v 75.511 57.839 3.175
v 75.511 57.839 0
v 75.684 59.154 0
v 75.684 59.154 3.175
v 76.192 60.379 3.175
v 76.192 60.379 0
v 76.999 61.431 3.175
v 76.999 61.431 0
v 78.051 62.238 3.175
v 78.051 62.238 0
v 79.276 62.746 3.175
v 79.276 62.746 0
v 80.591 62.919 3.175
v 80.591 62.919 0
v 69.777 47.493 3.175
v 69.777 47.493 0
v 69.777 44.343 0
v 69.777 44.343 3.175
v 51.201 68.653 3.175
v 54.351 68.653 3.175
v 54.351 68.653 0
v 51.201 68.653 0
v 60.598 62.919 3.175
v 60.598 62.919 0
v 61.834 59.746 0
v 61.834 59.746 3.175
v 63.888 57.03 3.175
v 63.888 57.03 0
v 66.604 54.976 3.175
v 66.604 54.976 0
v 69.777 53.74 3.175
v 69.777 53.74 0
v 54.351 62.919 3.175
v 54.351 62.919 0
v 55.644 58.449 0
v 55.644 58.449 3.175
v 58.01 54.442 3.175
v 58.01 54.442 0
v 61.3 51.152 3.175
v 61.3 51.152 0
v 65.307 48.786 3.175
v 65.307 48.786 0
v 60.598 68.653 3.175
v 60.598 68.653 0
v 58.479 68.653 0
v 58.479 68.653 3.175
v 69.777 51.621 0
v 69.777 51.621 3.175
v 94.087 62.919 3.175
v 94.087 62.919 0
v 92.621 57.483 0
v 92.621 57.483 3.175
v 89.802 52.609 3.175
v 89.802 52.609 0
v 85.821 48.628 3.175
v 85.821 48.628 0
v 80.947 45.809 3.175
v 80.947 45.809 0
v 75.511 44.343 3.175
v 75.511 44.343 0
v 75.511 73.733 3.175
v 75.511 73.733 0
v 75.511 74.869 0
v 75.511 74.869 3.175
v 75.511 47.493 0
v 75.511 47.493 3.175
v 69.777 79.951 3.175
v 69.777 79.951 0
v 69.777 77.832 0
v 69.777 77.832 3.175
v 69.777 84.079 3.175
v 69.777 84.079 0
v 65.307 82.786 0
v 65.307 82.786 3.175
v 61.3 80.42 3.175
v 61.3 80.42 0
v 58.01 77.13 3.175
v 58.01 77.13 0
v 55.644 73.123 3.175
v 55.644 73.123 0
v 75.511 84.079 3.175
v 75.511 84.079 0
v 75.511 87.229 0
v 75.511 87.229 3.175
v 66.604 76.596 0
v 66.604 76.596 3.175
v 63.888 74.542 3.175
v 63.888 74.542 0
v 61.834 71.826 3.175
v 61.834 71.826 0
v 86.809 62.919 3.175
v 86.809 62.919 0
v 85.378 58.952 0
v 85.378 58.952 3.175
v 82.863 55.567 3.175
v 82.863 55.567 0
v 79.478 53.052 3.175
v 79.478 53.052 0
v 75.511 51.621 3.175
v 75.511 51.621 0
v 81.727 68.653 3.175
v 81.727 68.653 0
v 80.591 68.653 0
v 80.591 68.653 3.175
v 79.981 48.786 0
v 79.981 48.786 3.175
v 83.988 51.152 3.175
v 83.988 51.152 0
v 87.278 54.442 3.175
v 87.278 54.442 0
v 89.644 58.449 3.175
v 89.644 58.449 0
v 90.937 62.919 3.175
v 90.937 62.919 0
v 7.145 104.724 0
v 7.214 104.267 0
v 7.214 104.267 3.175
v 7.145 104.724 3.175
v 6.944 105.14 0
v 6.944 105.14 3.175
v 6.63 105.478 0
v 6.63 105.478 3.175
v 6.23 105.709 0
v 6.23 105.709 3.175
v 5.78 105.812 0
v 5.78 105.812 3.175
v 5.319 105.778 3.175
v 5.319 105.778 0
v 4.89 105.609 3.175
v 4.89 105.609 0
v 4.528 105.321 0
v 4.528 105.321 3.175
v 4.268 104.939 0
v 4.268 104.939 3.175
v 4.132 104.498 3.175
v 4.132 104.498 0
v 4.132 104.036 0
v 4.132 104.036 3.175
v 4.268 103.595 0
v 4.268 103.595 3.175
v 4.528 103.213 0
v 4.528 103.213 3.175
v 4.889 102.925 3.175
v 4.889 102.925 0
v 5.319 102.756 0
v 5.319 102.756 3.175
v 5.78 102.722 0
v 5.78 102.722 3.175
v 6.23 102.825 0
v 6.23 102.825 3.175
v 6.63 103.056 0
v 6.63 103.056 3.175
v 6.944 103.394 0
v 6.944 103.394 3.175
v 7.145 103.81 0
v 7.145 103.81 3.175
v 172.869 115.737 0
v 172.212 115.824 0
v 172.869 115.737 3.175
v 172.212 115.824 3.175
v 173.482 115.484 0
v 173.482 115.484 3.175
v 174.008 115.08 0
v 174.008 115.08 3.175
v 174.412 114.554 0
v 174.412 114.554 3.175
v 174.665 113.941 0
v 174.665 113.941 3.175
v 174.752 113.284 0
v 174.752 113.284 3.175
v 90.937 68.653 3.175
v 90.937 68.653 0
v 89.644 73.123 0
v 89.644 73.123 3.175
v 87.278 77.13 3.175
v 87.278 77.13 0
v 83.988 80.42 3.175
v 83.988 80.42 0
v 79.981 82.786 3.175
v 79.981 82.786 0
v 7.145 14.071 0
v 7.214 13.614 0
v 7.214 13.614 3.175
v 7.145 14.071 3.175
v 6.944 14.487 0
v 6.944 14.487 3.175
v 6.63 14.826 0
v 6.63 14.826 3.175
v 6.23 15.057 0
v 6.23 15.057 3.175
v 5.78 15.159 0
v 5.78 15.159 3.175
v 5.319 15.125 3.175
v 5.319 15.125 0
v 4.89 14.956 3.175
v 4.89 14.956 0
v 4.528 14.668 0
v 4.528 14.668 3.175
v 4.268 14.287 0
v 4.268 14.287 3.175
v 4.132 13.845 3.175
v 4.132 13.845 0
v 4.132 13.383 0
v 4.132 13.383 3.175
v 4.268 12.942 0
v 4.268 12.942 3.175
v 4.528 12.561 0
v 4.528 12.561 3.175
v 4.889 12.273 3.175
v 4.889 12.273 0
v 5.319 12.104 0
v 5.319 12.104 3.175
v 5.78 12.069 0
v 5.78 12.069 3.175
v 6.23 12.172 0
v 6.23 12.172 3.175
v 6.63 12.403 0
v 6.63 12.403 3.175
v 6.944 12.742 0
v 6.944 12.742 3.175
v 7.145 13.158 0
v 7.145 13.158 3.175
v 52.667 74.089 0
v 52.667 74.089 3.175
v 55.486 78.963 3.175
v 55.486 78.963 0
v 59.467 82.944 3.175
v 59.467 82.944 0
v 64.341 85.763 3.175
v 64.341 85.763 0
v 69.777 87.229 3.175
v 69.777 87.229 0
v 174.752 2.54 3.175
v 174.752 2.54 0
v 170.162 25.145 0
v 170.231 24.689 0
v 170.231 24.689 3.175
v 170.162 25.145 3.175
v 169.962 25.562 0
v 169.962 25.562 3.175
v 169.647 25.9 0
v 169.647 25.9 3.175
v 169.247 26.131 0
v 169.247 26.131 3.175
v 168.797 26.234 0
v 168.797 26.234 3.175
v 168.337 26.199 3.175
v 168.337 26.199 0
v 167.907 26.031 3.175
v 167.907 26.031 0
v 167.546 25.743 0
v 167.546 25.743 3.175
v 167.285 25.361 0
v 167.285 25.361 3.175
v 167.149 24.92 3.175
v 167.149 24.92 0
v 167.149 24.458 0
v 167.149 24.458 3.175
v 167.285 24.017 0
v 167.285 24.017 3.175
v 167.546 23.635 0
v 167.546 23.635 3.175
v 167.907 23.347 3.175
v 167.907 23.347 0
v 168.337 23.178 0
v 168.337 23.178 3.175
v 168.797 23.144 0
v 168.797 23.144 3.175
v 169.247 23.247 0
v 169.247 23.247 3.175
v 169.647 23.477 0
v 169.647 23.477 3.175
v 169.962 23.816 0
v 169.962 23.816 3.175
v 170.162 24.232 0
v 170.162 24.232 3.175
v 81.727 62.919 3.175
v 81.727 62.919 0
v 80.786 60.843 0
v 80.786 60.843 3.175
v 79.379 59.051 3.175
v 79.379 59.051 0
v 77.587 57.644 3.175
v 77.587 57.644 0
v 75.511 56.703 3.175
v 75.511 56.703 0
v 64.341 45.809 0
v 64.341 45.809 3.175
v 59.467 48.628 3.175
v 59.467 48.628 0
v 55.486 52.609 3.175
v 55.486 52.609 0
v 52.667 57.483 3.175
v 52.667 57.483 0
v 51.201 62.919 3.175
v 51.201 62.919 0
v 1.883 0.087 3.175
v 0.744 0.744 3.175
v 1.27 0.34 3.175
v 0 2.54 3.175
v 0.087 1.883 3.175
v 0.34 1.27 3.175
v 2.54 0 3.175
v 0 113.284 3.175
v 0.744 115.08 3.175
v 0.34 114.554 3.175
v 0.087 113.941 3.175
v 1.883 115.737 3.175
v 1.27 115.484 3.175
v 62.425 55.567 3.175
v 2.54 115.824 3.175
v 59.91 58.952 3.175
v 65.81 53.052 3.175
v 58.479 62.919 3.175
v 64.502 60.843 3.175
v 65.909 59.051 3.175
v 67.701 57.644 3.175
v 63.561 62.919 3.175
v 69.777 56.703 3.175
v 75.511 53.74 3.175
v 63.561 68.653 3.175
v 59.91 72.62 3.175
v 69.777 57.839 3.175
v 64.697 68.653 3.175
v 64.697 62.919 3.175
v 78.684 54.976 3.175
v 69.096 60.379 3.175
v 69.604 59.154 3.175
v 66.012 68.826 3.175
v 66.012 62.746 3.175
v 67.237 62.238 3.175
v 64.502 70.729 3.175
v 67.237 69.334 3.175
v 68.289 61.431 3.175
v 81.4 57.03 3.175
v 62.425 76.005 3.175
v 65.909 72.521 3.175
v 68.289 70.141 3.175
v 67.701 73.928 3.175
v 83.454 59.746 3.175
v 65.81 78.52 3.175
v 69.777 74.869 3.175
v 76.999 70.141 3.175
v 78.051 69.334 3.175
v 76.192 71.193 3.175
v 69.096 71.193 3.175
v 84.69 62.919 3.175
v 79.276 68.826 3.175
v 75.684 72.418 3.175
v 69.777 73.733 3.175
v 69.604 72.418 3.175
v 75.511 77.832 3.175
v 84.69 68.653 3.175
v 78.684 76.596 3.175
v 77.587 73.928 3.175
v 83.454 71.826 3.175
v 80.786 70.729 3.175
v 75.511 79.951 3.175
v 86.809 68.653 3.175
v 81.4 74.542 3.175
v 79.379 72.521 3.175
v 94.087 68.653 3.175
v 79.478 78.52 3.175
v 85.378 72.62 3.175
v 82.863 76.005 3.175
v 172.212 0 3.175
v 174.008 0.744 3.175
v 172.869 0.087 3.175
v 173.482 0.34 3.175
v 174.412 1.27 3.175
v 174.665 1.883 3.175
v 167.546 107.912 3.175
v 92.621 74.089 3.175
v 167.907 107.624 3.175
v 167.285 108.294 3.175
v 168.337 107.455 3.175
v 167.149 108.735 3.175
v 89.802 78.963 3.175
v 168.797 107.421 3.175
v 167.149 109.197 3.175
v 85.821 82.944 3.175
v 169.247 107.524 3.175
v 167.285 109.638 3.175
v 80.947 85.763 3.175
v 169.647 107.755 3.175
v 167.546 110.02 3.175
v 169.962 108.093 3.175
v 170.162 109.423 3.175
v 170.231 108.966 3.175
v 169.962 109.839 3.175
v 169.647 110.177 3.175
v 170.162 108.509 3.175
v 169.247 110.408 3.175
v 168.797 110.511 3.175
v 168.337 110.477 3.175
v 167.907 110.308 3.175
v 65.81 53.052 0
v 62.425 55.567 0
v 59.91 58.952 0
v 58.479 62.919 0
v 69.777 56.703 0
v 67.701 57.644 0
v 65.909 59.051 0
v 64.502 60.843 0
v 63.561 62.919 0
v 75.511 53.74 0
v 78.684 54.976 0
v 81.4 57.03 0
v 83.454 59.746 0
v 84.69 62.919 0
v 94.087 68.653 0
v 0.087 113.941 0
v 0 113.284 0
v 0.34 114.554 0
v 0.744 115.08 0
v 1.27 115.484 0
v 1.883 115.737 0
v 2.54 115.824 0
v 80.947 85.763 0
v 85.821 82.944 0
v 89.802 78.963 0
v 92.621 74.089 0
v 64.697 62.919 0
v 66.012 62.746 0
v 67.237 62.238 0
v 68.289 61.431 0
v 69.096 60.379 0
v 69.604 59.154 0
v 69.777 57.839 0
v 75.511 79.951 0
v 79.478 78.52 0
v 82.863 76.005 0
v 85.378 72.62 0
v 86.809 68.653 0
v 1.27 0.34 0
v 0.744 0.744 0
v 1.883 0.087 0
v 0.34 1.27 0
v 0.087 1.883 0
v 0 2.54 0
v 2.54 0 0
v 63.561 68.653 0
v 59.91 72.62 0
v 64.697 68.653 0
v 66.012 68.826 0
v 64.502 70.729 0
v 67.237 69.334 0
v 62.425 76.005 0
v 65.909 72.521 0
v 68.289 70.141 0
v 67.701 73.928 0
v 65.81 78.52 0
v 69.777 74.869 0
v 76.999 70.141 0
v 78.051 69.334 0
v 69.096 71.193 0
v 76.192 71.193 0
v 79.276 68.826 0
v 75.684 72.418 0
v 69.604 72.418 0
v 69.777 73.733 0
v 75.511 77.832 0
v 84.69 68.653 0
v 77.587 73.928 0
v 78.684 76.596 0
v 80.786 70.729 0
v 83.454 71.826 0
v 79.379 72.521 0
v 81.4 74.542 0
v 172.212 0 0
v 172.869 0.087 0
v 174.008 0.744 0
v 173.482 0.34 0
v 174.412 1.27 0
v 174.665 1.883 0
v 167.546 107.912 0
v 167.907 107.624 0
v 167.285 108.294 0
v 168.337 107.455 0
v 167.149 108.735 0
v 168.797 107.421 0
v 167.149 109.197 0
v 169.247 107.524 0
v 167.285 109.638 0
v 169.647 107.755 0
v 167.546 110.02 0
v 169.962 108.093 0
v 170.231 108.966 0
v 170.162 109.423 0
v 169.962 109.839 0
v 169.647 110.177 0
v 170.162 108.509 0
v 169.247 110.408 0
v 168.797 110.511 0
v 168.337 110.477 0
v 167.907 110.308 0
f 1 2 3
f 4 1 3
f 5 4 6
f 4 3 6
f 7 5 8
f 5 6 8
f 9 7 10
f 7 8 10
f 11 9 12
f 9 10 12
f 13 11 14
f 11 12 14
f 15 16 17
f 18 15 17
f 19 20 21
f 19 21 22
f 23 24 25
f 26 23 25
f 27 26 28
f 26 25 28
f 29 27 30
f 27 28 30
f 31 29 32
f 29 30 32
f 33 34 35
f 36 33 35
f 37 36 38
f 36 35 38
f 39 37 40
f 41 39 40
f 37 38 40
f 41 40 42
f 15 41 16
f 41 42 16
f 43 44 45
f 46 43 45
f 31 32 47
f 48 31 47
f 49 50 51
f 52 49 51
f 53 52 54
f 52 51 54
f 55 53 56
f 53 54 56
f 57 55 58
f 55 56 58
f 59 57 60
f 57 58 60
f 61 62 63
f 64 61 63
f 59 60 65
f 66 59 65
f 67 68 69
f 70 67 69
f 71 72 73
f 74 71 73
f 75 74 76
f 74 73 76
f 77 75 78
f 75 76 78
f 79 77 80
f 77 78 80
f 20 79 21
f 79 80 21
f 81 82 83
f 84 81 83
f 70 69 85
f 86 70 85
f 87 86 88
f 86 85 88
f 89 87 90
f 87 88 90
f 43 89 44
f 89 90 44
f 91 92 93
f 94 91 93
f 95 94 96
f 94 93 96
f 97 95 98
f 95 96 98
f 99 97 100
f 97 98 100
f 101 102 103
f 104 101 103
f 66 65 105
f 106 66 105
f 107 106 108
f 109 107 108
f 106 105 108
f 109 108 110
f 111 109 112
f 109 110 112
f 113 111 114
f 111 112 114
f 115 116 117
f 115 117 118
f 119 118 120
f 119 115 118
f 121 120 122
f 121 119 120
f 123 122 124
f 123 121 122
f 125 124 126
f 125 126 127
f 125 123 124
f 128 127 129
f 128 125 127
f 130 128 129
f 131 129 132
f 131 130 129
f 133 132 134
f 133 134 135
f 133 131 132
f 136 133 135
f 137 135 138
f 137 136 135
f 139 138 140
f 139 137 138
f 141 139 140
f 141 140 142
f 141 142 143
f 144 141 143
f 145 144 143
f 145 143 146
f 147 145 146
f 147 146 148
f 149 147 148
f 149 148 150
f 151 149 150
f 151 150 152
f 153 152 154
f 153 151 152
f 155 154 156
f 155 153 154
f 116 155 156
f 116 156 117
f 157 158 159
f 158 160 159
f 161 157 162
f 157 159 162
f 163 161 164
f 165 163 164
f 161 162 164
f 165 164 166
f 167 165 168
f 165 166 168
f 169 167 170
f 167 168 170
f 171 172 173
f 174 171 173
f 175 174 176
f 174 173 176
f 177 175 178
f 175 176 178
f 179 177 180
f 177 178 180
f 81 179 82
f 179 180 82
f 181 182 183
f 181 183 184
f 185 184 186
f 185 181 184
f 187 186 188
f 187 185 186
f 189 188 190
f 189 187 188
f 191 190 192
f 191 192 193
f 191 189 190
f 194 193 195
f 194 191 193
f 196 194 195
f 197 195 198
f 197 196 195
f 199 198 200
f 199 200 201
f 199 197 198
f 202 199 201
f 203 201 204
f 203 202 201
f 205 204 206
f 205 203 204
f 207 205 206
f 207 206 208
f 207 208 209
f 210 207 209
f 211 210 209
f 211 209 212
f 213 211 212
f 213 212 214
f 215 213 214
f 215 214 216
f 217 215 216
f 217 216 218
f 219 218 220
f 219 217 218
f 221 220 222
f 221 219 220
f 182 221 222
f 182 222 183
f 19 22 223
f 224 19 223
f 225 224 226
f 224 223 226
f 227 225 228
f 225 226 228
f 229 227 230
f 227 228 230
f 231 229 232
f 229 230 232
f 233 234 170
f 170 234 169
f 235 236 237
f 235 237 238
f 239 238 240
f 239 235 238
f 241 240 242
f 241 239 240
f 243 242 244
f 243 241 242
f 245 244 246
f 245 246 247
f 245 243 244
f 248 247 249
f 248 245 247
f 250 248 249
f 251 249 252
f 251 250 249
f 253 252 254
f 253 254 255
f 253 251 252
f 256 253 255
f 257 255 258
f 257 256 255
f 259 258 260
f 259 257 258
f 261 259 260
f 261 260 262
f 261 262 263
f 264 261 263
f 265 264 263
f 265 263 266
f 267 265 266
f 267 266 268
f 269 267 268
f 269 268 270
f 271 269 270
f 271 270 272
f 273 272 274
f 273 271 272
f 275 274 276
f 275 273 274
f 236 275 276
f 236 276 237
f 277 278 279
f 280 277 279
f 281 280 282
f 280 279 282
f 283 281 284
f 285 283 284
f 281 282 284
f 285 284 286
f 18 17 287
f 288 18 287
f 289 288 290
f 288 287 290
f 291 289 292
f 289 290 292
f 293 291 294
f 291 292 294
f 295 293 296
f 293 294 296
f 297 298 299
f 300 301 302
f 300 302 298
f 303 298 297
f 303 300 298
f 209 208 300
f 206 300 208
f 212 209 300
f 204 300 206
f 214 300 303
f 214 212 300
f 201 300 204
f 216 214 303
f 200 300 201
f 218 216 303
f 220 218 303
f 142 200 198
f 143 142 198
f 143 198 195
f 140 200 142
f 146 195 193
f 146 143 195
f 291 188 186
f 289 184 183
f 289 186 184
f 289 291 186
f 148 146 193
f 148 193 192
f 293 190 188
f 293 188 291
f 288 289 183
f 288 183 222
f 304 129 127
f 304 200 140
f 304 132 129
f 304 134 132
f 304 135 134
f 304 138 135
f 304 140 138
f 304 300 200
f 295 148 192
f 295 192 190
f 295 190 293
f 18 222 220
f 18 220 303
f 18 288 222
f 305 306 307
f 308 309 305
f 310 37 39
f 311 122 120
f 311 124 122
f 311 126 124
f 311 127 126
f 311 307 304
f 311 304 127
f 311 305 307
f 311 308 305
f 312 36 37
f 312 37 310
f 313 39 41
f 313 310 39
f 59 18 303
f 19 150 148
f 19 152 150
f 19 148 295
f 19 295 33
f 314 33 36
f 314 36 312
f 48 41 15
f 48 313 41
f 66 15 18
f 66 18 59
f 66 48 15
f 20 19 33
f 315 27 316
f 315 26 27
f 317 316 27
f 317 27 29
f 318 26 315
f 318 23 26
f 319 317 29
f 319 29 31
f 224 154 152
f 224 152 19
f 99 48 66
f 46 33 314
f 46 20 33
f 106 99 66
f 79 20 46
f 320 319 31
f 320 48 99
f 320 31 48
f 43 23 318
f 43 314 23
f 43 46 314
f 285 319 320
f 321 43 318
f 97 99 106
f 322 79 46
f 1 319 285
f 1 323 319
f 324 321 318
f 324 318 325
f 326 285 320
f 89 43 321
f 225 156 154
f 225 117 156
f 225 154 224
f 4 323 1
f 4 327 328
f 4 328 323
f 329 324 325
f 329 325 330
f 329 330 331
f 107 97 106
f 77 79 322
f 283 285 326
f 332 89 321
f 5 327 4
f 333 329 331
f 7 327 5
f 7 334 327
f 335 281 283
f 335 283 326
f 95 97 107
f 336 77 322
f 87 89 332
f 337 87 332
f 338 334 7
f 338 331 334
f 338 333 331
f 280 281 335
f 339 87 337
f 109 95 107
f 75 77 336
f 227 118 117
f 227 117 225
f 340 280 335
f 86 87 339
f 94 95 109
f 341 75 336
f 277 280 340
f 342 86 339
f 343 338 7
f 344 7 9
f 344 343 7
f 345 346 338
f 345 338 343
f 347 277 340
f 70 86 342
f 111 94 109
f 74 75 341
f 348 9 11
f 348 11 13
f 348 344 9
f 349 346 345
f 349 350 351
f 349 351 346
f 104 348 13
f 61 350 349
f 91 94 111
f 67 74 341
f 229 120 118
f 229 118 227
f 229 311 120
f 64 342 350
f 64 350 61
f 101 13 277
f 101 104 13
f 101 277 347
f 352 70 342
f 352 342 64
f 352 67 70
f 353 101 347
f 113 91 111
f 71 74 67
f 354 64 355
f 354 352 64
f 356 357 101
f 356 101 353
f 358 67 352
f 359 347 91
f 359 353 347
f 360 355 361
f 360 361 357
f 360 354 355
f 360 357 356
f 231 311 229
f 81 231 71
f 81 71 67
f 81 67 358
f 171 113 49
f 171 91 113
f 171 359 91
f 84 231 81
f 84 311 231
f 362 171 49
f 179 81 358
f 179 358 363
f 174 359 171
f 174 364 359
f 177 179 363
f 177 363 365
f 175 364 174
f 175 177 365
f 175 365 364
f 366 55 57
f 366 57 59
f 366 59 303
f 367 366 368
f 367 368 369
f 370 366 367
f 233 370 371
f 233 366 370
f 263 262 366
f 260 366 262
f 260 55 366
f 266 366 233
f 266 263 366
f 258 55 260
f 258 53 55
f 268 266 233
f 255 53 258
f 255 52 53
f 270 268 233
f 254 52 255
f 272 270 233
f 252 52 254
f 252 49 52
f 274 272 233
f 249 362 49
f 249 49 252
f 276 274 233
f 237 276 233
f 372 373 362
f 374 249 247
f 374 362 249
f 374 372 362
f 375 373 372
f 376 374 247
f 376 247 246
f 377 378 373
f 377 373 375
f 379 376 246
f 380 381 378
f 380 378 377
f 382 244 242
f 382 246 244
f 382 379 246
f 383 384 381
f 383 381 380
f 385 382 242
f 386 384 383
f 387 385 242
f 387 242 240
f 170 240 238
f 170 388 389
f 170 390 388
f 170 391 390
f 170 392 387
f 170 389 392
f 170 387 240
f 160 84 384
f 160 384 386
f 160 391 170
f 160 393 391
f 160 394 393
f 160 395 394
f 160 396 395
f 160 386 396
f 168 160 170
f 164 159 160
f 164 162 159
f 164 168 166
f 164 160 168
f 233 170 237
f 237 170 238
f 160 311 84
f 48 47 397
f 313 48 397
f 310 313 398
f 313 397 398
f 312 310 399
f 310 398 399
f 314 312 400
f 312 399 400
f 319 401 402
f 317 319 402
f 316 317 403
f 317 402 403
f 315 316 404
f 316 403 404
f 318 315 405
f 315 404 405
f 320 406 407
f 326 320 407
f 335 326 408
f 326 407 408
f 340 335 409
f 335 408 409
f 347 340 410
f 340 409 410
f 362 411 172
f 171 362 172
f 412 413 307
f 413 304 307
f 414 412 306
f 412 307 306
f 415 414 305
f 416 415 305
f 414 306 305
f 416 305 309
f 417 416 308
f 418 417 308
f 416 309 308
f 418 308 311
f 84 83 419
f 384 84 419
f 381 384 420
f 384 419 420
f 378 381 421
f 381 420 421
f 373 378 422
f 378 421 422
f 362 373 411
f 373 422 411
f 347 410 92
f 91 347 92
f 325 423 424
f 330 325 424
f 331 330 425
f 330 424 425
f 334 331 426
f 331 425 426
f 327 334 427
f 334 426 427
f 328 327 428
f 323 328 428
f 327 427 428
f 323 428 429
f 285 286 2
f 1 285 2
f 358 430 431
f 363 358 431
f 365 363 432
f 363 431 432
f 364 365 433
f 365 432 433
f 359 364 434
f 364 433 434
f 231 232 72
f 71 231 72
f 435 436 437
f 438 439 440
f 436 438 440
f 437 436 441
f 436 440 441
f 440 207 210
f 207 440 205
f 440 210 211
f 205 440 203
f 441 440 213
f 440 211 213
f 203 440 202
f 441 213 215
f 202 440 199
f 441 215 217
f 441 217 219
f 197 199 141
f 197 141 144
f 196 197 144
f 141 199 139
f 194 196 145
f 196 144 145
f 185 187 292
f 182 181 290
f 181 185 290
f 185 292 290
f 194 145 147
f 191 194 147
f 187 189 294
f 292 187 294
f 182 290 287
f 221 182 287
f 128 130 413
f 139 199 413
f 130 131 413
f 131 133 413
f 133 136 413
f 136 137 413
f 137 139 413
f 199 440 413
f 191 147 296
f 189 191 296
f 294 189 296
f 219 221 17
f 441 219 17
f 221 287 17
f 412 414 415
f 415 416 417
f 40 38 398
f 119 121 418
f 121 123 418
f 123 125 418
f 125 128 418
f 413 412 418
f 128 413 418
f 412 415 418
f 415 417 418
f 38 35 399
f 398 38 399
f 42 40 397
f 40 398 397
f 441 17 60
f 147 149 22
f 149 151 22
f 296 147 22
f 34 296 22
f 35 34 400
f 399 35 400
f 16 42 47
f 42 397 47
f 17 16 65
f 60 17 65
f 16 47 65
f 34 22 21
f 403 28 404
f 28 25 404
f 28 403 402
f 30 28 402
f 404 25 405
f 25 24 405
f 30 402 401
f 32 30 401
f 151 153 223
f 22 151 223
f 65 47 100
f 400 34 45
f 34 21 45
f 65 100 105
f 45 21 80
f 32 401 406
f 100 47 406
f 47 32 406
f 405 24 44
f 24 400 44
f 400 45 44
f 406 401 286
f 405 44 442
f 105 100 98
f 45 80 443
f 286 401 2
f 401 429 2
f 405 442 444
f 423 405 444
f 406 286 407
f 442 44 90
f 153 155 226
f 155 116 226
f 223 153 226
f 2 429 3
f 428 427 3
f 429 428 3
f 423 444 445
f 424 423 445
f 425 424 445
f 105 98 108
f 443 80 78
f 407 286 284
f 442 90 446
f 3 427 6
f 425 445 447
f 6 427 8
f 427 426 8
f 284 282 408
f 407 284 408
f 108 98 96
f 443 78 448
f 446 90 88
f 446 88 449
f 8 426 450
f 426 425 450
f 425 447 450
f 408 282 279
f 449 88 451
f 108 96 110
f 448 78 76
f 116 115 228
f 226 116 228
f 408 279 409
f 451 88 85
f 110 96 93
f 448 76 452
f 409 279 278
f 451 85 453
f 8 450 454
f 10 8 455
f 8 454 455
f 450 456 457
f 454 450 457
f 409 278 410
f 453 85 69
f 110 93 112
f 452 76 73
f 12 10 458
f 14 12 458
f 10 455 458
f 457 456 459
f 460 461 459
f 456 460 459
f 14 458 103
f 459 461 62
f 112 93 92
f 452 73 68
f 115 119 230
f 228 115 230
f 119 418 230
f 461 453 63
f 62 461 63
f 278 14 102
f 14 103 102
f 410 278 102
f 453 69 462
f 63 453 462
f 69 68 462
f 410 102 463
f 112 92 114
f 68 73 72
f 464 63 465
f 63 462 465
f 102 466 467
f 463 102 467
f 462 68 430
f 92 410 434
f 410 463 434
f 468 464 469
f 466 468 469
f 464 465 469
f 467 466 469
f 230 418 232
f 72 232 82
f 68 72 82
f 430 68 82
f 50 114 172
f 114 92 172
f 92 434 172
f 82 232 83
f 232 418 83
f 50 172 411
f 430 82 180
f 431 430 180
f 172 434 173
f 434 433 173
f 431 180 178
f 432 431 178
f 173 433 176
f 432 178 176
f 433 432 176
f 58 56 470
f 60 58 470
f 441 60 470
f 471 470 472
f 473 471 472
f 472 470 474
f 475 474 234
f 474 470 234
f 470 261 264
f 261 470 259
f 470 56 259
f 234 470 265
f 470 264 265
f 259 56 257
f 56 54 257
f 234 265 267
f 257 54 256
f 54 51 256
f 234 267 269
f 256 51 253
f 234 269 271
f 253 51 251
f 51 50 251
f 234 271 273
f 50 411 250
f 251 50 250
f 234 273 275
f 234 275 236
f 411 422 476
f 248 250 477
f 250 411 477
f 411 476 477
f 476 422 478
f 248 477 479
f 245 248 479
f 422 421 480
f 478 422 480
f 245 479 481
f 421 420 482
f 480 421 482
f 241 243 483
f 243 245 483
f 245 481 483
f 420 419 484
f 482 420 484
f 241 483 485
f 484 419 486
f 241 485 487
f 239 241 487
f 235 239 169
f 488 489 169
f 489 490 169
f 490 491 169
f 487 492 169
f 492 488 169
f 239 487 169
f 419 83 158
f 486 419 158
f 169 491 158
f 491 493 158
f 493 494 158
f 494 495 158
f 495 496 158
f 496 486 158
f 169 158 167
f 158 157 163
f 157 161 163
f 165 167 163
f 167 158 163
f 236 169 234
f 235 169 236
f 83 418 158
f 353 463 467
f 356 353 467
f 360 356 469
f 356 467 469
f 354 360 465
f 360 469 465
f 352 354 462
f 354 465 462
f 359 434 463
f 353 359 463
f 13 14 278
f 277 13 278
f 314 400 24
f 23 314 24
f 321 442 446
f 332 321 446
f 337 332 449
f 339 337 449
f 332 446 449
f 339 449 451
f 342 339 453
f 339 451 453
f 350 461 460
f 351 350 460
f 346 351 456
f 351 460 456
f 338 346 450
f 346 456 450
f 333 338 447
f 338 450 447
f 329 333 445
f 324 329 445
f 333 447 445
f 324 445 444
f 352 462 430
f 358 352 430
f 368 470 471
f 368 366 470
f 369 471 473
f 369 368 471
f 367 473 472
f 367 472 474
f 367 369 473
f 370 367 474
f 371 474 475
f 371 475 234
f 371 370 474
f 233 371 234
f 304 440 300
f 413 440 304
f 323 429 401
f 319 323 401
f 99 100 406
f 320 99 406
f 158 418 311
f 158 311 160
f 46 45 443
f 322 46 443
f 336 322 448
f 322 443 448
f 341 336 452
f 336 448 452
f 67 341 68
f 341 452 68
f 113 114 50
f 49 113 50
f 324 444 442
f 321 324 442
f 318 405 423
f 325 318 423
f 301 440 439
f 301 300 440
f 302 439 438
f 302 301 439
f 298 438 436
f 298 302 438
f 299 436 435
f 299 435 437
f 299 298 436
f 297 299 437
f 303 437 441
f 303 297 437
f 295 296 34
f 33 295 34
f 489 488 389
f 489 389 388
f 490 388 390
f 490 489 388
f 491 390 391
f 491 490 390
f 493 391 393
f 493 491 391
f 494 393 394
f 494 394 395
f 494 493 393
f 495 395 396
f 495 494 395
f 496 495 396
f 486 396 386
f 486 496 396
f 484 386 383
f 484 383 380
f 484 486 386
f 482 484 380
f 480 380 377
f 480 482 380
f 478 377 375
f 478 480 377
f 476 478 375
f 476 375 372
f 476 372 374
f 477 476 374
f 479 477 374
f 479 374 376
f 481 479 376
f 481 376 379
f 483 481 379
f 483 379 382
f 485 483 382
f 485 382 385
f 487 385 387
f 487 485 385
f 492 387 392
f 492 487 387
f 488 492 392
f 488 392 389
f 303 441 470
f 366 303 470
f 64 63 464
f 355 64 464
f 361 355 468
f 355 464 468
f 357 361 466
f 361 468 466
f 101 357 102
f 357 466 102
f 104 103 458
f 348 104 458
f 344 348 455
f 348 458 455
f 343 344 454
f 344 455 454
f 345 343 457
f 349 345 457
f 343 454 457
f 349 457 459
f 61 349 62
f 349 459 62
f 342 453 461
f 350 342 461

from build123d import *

# Parameters (mm, degrees)
SKETCH1_W           = 174.752
SKETCH1_H           = 115.824
SKETCH1_R           = 1.5494
BOSS_EXTRUDE2_DEPTH = 3.175
FILLET2_R           = 2.54


with BuildPart() as part:
    # Sketch1 → Boss-Extrude2 (new body)
    with BuildSketch(Plane.XY):
        with Locations((87.376, 57.912)):
            Rectangle(SKETCH1_W, SKETCH1_H)
        with BuildLine():
            Line((51.201113755, 62.918740671), (54.351132043, 62.918740671))
            ThreePointArc((54.351132043, 62.918740671), (59.551059271, 52.693059261), (69.776740685, 47.493132041))
            Line((69.776740685, 47.493132041), (69.776740685, 44.343113753))
            ThreePointArc((69.776740685, 44.343113753), (57.34663836, 50.48863835), (51.201113755, 62.918740671))
        make_face(mode=Mode.SUBTRACT)
        with BuildLine():
            Line((58.47906711, 62.918740671), (60.598040919, 62.918740671))
            ThreePointArc((60.598040919, 62.918740671), (63.888250287, 57.030250277), (69.776740685, 53.740040915))
            Line((69.776740685, 53.740040915), (69.776740685, 51.621067107))
            ThreePointArc((69.776740685, 51.621067107), (62.424741229, 55.566741219), (58.47906711, 62.918740671))
        make_face(mode=Mode.SUBTRACT)
        with BuildLine():
            ThreePointArc((69.776740685, 56.70280403), (65.908807914, 59.050807904), (63.560804035, 62.918740671))
            Line((63.560804035, 62.918740671), (64.696740685, 62.918740671))
            ThreePointArc((64.696740685, 62.918740671), (68.288843133, 61.43084312), (69.776740685, 57.838740671))
            Line((69.776740685, 57.838740671), (69.776740685, 56.70280403))
        make_face(mode=Mode.SUBTRACT)
        with BuildLine():
            ThreePointArc((75.511259315, 47.493132041), (85.736940729, 52.693059261), (90.936867957, 62.918740671))
            Line((90.936867957, 62.918740671), (94.086886245, 62.918740671))
            ThreePointArc((94.086886245, 62.918740671), (87.94136164, 50.48863835), (75.511259315, 44.343113753))
            Line((75.511259315, 44.343113753), (75.511259315, 47.493132041))
        make_face(mode=Mode.SUBTRACT)
        with BuildLine():
            ThreePointArc((75.511259315, 53.740040915), (81.399749713, 57.030250277), (84.689959081, 62.918740671))
            Line((84.689959081, 62.918740671), (86.80893289, 62.918740671))
            ThreePointArc((86.80893289, 62.918740671), (82.863258771, 55.566741219), (75.511259315, 51.621067107))
            Line((75.511259315, 51.621067107), (75.511259315, 53.740040915))
        make_face(mode=Mode.SUBTRACT)
        with BuildLine():
            Line((80.591259315, 62.918740671), (81.727195965, 62.918740671))
            ThreePointArc((81.727195965, 62.918740671), (79.379192086, 59.050807904), (75.511259315, 56.70280403))
            Line((75.511259315, 56.70280403), (75.511259315, 57.838740671))
            ThreePointArc((75.511259315, 57.838740671), (76.999156867, 61.43084312), (80.591259315, 62.918740671))
        make_face(mode=Mode.SUBTRACT)
        with BuildLine():
            Line((64.696740685, 68.653259329), (63.560804035, 68.653259329))
            ThreePointArc((63.560804035, 68.653259329), (65.908807914, 72.521192096), (69.776740685, 74.86919597))
            Line((69.776740685, 74.86919597), (69.776740685, 73.733259329))
            ThreePointArc((69.776740685, 73.733259329), (68.288843133, 70.14115688), (64.696740685, 68.653259329))
        make_face(mode=Mode.SUBTRACT)
        with BuildLine():
            Line((69.776740685, 79.950932893), (69.776740685, 77.831959085))
            ThreePointArc((69.776740685, 77.831959085), (63.888250287, 74.541749723), (60.598040919, 68.653259329))
            Line((60.598040919, 68.653259329), (58.47906711, 68.653259329))
            ThreePointArc((58.47906711, 68.653259329), (62.424741229, 76.005258781), (69.776740685, 79.950932893))
        make_face(mode=Mode.SUBTRACT)
        with BuildLine():
            ThreePointArc((69.776740685, 84.078867959), (59.551059271, 78.878940739), (54.351132043, 68.653259329))
            Line((54.351132043, 68.653259329), (51.201113755, 68.653259329))
            ThreePointArc((51.201113755, 68.653259329), (57.34663836, 81.08336165), (69.776740685, 87.228886247))
            Line((69.776740685, 87.228886247), (69.776740685, 84.078867959))
        make_face(mode=Mode.SUBTRACT)
        with BuildLine():
            Line((75.511259315, 73.733259329), (75.511259315, 74.86919597))
            ThreePointArc((75.511259315, 74.86919597), (79.379192086, 72.521192096), (81.727195965, 68.653259329))
            Line((81.727195965, 68.653259329), (80.591259315, 68.653259329))
            ThreePointArc((80.591259315, 68.653259329), (76.999156867, 70.14115688), (75.511259315, 73.733259329))
        make_face(mode=Mode.SUBTRACT)
        with BuildLine():
            Line((86.80893289, 68.653259329), (84.689959081, 68.653259329))
            ThreePointArc((84.689959081, 68.653259329), (81.399749713, 74.541749723), (75.511259315, 77.831959085))
            Line((75.511259315, 77.831959085), (75.511259315, 79.950932893))
            ThreePointArc((75.511259315, 79.950932893), (82.863258771, 76.005258781), (86.80893289, 68.653259329))
        make_face(mode=Mode.SUBTRACT)
        with BuildLine():
            ThreePointArc((90.936867957, 68.653259329), (85.736940729, 78.878940739), (75.511259315, 84.078867959))
            Line((75.511259315, 84.078867959), (75.511259315, 87.228886247))
            ThreePointArc((75.511259315, 87.228886247), (87.94136164, 81.08336165), (94.086886245, 68.653259329))
            Line((94.086886245, 68.653259329), (90.936867957, 68.653259329))
        make_face(mode=Mode.SUBTRACT)
        with Locations((5.6642, 13.6144)):
            Circle(SKETCH1_R, mode=Mode.SUBTRACT)
        with Locations((168.6814, 24.6888)):
            Circle(SKETCH1_R, mode=Mode.SUBTRACT)
        with Locations((5.6642, 104.267)):
            Circle(SKETCH1_R, mode=Mode.SUBTRACT)
        with Locations((168.6814, 108.966)):
            Circle(SKETCH1_R, mode=Mode.SUBTRACT)
    extrude(amount=BOSS_EXTRUDE2_DEPTH)

    # Fillet2
    fillet2_edges = [part.edges().sort_by_distance(p)[0] for p in [
        (174.752, 0, 1.5875),
        (0, 0, 1.5875),
        (0, 115.824, 1.5875),
        (174.752, 115.824, 1.5875),
    ]]
    fillet(fillet2_edges, radius=FILLET2_R)


solid = part.part
